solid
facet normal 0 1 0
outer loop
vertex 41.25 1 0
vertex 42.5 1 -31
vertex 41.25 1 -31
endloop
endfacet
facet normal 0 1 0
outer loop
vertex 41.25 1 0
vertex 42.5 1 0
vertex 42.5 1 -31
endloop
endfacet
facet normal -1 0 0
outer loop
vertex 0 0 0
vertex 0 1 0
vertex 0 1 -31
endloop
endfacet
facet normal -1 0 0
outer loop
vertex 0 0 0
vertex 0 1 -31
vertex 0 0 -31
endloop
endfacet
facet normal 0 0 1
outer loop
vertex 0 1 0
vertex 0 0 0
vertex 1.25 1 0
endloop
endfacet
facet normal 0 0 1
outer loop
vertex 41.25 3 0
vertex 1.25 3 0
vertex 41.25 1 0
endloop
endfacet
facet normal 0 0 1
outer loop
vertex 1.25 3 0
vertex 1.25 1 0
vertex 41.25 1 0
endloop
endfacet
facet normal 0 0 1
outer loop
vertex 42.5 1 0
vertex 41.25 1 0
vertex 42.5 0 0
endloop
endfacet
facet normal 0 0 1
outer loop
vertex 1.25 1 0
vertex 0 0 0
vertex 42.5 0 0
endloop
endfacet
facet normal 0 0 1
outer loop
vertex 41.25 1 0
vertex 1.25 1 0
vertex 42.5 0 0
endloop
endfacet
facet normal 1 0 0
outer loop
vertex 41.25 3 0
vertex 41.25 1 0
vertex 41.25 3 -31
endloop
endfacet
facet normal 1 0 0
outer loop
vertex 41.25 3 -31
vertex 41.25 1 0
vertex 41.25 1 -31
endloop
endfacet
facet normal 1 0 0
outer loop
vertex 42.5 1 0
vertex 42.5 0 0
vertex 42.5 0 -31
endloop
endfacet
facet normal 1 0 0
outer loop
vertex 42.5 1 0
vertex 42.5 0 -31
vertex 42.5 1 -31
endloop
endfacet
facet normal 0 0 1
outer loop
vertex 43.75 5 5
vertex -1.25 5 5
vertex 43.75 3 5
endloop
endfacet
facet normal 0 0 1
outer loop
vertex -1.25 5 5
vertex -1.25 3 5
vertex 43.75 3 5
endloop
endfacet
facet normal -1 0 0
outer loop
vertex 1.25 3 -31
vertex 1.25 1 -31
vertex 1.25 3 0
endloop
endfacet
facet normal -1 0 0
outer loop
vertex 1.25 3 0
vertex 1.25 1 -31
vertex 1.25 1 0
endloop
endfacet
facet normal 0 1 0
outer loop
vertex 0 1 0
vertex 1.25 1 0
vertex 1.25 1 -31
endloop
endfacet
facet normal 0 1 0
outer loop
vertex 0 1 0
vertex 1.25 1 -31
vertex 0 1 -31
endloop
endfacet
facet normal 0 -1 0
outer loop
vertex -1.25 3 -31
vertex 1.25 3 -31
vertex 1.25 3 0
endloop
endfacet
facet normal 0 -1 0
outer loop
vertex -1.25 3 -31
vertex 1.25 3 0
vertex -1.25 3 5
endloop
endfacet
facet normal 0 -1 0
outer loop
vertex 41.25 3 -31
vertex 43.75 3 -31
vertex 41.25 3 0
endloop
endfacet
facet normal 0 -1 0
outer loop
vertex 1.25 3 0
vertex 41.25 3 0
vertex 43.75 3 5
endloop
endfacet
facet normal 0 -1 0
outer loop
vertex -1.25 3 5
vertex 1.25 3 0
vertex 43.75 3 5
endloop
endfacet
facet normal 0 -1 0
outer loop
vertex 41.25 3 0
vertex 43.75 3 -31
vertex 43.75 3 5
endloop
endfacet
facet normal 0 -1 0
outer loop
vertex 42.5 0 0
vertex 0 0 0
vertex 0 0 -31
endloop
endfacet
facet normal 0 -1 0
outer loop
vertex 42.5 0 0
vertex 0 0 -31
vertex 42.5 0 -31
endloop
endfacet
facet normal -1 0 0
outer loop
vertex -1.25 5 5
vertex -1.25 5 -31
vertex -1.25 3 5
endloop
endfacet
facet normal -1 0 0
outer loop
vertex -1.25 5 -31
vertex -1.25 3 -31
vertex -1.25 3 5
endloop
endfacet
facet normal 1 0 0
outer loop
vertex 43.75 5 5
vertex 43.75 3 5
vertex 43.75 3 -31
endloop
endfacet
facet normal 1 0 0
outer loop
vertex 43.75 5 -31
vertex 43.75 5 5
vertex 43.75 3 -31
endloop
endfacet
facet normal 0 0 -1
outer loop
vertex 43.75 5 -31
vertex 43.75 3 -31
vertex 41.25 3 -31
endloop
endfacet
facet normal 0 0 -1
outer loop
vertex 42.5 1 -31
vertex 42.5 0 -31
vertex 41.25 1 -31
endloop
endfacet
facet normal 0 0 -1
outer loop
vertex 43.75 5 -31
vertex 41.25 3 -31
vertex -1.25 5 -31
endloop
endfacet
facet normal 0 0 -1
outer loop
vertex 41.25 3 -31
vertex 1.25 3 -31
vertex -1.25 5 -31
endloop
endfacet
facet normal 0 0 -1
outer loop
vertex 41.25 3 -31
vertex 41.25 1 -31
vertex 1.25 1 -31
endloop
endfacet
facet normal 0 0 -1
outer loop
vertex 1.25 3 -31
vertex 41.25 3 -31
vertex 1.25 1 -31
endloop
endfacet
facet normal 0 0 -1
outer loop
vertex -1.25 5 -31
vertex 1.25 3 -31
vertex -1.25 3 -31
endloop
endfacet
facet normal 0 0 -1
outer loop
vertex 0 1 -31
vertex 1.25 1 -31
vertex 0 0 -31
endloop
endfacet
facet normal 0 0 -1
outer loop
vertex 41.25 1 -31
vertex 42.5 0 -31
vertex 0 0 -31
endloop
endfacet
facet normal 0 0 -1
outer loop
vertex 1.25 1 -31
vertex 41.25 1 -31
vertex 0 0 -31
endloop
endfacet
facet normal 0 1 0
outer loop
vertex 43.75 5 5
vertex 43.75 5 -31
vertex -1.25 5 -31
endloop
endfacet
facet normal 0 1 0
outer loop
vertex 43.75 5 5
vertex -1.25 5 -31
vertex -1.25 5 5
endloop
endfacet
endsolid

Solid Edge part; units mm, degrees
sketch "Sketch1" plane through (0, 0, 0) normal (0, 0, 1) x (1, 0, 0)
  line L0 (42.5, 1) -> (0, 1)
  line L1 (0, 1) -> (0, 0)
  line L2 (0, 0) -> (42.5, 0)
  line L3 (42.5, 0) -> (42.5, 1)
extrude "Protrusion1" add sketch "Sketch1" against normal blind 31
sketch "Sketch2" plane through (21.25, 1, -15.5) normal (0, 1, 0) x (1, 0, 0)
  line L0 (20, -15.5) -> (20, 15.5)
  line L1 (20, 15.5) -> (-20, 15.5)
  line L2 (-20, 15.5) -> (-20, -15.5)
  line L3 (-20, -15.5) -> (20, -15.5)
extrude "Vysunutí_2" add sketch "Sketch2" along normal blind 2
sketch "Sketch3" plane through (21.25, 3, -15.5) normal (0, 1, 0) x (1, 0, 0)
  line L0 (-22.5, -15.5) -> (22.5, -15.5)
  line L1 (22.5, -15.5) -> (22.5, 15.5)
  line L2 (22.5, 15.5) -> (-22.5, 15.5)
  line L3 (-22.5, 15.5) -> (-22.5, -15.5)
extrude "Vysunutí_3" add sketch "Sketch3" along normal blind 2
sketch "Sketch4" plane through (21.25, 3, -15.5) normal (0, 1, 0) x (1, 0, 0)
  line L0 (22.5, -20.5) -> (22.5, -15.5)
  line L1 (-22.5, -20.5) -> (22.5, -20.5)
  line L2 (-22.5, -15.5) -> (-22.5, -20.5)
extrude "Protrusion2" add sketch "Sketch4" along normal blind 2 material side at (43.8, 3, 2.5)
